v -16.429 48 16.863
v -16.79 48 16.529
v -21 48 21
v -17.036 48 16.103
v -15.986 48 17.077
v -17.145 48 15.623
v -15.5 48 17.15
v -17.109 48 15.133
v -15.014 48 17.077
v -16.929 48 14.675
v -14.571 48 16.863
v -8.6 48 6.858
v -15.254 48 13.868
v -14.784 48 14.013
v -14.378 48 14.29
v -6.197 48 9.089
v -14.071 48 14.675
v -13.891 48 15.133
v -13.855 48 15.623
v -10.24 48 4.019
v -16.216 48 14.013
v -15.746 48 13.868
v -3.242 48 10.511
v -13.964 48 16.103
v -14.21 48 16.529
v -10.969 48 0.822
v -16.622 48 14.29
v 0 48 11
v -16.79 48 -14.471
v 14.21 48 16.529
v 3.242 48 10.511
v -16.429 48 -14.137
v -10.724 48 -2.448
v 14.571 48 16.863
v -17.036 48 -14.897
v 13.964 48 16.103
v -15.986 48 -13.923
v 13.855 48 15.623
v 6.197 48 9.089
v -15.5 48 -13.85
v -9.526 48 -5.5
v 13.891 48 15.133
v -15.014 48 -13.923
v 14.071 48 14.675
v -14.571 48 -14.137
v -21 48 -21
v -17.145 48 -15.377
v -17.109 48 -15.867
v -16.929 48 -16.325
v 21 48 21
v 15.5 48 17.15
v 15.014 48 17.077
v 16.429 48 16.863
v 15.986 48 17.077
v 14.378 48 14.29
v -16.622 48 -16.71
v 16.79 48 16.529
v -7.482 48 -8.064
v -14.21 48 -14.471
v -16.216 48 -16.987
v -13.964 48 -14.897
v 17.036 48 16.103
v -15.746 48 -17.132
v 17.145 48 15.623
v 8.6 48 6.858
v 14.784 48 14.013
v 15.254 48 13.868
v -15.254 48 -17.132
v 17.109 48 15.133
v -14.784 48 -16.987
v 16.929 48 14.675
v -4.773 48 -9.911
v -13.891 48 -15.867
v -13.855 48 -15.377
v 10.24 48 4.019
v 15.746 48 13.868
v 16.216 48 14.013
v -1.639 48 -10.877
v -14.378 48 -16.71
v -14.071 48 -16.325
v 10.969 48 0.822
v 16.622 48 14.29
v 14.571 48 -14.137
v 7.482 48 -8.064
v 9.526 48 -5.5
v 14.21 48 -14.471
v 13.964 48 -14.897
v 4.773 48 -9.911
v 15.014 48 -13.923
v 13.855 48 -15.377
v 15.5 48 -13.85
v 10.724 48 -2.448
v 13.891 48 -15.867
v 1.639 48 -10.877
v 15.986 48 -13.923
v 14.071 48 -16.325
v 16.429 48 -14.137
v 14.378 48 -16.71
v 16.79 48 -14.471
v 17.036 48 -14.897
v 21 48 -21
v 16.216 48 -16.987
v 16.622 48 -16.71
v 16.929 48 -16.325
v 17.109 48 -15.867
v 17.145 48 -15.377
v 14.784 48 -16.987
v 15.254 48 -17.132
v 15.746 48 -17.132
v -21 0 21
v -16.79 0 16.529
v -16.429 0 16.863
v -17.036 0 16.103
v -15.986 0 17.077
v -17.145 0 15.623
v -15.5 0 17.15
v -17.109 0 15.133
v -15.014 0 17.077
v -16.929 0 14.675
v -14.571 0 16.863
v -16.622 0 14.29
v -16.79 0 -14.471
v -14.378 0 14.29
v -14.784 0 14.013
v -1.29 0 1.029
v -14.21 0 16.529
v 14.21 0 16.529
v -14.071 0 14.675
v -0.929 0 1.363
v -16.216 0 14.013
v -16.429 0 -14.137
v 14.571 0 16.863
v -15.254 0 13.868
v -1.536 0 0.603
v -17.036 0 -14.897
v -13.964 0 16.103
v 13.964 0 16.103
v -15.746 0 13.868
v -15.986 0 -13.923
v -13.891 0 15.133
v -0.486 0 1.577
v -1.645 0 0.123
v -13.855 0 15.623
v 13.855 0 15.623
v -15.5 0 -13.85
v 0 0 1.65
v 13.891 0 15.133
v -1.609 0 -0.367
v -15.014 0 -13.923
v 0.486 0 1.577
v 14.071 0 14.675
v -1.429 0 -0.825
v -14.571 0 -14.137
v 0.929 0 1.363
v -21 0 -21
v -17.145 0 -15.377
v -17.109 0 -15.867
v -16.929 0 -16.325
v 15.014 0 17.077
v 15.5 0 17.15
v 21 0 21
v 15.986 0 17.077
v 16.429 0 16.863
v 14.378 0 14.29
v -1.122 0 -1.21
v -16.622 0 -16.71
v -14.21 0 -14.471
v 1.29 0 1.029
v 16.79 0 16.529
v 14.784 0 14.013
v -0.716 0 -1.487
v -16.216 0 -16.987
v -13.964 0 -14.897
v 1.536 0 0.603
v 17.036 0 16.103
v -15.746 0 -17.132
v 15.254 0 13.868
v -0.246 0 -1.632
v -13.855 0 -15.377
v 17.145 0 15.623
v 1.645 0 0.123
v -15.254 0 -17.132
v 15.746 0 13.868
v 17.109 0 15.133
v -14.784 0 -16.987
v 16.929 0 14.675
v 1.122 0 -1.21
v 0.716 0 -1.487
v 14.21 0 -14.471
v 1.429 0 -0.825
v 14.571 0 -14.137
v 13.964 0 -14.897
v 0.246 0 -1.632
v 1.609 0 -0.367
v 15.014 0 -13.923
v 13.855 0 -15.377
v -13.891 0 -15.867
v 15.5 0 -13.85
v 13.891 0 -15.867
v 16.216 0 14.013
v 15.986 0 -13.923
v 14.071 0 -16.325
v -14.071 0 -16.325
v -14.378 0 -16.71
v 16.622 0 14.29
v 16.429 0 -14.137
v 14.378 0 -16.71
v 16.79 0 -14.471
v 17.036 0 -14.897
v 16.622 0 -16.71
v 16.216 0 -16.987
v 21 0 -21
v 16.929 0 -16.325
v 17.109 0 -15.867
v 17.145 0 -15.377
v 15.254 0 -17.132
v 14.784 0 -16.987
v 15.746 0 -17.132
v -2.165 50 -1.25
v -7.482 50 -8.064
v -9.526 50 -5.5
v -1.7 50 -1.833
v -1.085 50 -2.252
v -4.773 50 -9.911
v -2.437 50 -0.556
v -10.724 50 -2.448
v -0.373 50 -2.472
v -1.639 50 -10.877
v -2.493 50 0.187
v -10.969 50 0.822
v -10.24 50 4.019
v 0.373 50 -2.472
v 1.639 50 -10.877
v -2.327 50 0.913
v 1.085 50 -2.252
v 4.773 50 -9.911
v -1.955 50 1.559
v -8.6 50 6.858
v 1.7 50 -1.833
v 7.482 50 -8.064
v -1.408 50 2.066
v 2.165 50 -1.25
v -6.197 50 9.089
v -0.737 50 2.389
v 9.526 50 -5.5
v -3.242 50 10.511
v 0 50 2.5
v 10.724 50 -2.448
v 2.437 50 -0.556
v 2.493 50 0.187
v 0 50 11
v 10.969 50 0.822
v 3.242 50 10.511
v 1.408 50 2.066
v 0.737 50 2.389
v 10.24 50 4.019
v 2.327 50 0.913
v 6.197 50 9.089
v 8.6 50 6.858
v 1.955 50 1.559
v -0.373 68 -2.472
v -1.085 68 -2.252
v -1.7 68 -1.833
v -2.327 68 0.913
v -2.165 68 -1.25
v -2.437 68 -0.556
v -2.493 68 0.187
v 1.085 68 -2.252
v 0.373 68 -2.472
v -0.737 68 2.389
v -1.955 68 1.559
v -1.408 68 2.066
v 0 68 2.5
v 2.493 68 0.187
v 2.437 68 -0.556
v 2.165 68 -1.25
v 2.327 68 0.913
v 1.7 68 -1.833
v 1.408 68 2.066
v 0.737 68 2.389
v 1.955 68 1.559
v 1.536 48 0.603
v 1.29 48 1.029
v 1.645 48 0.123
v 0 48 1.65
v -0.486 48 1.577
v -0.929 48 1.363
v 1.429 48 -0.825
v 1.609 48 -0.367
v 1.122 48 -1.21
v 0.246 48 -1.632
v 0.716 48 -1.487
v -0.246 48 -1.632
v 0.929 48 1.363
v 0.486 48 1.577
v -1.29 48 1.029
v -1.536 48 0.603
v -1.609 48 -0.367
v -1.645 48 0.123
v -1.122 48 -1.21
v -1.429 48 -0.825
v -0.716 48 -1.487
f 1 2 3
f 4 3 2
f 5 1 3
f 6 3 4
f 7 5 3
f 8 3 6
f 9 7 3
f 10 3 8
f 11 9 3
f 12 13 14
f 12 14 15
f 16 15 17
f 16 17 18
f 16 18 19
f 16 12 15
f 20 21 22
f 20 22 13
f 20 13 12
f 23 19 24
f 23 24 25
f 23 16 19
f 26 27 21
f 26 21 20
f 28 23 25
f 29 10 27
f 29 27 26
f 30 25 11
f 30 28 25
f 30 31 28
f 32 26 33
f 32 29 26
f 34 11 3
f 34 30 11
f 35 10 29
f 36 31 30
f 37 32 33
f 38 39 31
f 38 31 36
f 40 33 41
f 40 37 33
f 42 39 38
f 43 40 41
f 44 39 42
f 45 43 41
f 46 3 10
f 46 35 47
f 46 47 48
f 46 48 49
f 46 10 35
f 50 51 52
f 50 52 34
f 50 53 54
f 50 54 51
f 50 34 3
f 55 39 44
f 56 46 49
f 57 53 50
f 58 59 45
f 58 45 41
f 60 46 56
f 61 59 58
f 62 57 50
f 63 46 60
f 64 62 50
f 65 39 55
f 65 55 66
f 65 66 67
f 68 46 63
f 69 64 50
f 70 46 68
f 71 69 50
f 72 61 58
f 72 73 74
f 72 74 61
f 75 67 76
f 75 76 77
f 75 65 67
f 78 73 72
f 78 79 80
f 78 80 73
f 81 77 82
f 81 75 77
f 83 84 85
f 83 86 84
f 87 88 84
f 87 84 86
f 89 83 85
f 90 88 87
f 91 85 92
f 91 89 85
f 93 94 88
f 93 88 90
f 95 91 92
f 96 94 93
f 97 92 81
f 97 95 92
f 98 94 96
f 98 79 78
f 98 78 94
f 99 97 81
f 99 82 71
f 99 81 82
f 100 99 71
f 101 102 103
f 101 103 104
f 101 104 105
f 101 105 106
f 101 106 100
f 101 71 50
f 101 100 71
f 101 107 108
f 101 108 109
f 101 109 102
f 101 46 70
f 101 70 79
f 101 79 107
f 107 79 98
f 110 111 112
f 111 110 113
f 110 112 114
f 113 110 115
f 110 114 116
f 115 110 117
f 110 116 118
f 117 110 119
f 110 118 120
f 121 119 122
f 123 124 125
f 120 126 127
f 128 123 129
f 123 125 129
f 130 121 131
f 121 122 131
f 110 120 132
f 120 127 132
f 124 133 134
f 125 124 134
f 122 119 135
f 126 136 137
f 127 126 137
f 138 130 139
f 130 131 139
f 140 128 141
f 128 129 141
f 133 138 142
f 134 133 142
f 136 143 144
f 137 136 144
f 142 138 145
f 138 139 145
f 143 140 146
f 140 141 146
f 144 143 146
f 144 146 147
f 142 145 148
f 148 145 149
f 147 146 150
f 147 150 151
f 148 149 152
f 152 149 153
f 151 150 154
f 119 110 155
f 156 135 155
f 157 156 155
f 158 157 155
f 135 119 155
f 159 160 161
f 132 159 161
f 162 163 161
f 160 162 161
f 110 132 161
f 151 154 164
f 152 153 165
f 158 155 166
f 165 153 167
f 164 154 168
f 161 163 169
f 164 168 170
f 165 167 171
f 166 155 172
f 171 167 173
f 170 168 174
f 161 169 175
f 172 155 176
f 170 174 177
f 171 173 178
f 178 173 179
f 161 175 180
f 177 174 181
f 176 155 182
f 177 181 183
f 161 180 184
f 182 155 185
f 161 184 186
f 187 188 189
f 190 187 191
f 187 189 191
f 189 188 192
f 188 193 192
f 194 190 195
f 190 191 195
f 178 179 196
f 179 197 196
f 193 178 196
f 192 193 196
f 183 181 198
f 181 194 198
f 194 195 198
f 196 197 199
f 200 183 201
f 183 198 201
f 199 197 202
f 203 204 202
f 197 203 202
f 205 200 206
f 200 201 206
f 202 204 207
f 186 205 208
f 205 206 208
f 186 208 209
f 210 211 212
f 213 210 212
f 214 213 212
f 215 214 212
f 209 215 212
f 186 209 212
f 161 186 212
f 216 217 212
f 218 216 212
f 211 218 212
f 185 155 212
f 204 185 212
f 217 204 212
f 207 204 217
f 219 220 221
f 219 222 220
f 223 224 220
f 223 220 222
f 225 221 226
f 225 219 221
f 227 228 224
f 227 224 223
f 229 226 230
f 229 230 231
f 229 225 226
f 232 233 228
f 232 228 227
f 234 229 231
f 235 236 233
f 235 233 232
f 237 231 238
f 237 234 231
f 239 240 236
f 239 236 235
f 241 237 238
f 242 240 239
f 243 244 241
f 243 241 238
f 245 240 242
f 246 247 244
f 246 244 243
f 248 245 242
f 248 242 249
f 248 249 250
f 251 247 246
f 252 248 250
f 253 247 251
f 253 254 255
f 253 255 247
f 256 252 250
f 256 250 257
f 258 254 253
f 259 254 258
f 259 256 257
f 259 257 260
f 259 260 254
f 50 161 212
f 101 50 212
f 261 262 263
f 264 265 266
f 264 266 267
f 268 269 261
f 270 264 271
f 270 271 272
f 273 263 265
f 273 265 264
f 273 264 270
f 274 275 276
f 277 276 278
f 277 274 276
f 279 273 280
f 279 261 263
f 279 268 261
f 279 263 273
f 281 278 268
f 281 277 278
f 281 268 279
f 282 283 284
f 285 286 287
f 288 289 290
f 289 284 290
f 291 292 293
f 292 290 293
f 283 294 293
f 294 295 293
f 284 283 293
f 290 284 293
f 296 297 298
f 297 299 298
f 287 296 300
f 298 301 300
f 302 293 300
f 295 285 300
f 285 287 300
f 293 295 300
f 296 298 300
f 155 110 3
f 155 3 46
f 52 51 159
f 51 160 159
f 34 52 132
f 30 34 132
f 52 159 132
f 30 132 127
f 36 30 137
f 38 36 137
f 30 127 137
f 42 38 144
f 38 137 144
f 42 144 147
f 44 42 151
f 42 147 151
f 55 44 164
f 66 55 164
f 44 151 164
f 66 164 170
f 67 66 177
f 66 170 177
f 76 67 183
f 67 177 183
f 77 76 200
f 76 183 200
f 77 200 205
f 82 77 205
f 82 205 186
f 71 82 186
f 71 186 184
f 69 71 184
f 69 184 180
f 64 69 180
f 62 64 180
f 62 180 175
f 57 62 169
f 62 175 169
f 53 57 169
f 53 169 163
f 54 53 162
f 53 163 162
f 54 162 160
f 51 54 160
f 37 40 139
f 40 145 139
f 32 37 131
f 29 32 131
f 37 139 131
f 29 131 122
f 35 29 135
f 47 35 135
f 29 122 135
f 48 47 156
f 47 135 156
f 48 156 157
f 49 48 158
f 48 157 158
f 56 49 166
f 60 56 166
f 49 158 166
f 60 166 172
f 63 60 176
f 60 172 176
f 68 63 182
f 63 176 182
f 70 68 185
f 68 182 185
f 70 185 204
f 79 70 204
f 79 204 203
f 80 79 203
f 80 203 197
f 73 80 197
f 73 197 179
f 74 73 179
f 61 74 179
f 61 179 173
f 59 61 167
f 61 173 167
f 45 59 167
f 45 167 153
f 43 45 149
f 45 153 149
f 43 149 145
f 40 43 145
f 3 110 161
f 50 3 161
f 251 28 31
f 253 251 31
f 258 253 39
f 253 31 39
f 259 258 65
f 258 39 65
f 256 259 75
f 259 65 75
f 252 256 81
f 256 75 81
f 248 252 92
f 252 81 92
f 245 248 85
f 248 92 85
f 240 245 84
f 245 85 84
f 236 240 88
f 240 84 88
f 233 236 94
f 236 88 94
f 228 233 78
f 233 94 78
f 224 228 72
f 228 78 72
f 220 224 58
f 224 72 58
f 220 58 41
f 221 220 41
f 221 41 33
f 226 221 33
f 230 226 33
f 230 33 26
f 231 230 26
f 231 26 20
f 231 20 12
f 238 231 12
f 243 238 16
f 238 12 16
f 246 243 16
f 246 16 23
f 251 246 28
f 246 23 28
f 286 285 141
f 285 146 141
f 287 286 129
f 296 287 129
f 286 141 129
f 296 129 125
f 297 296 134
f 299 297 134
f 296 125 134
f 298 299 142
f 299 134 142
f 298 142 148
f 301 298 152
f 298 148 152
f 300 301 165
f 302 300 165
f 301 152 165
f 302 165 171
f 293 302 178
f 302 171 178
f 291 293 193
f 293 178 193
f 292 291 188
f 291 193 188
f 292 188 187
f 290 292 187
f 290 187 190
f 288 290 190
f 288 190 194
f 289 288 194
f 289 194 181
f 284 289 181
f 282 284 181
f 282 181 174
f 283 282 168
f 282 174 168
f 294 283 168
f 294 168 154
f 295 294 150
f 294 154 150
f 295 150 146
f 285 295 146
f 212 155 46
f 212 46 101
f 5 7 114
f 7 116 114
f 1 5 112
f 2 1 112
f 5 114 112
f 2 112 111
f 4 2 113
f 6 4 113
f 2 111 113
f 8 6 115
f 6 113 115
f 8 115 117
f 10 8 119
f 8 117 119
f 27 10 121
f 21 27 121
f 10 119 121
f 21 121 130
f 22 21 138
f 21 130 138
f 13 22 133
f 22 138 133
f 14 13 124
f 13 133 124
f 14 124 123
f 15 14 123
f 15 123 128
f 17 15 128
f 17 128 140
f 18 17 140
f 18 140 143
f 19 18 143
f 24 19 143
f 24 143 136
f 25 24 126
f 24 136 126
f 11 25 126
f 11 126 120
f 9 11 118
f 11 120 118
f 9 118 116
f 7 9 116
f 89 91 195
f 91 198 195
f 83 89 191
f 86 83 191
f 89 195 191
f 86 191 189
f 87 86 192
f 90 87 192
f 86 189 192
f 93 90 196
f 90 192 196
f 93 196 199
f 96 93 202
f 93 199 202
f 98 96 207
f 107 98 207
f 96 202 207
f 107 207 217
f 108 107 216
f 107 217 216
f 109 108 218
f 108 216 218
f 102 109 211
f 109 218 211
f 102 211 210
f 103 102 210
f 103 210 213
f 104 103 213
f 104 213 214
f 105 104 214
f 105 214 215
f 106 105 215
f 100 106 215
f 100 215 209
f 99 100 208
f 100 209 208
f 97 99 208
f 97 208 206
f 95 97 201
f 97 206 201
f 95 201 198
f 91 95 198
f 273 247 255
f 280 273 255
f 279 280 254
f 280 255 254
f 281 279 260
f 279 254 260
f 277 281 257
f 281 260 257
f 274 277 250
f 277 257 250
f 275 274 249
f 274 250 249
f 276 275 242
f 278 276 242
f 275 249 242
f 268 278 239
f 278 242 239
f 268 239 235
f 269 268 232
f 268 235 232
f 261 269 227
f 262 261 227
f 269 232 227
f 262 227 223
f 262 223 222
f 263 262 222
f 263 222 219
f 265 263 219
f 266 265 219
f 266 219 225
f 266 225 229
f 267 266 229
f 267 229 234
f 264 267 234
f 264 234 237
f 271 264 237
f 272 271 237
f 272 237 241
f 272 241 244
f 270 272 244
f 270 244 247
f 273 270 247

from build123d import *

# Parameters (mm, degrees)
SKETCH1_W                            = 42
SKETCH1_H                            = 42
BOSS_EXTRUDE1_DEPTH                  = 48
SKETCH2_R                            = 2.5
BOSS_EXTRUDE2_DEPTH                  = 20
SKETCH4_W                            = 1.65
SKETCH4_H                            = 48
TAP_DRILL_FOR_M4X0_7_TAP1_AT_2_COUNT = 2
TAP_DRILL_FOR_M4X0_7_TAP1_AT_2_PITCH = 31
TAP_DRILL_FOR_M4X0_7_TAP1_AT_3_COUNT = 2
TAP_DRILL_FOR_M4X0_7_TAP1_AT_3_PITCH = 43.840620434
TAP_DRILL_FOR_M4X0_7_TAP1_AT_4_COUNT = 2
TAP_DRILL_FOR_M4X0_7_TAP1_AT_4_PITCH = 31
TAP_DRILL_FOR_M4X0_7_TAP1_AT_5_COUNT = 2
TAP_DRILL_FOR_M4X0_7_TAP1_AT_5_PITCH = 21.920310217
SKETCH6_R                            = 11
BOSS_EXTRUDE3_DEPTH                  = 2


with BuildPart() as part:
    # Sketch1 → Boss-Extrude1 (new body)
    with BuildSketch(Plane(origin=(0, 0, 0), x_dir=(1, 0, 0), z_dir=(0, 1, 0))):
        Rectangle(SKETCH1_W, SKETCH1_H)
    extrude(amount=BOSS_EXTRUDE1_DEPTH)

    # Sketch2 → Boss-Extrude2 (add)
    with BuildSketch(Plane(origin=(0, 48, 0), x_dir=(1, 0, 0), z_dir=(0, 1, 0))):
        with Locations(Location((0, 0, 0), (0, 0, 270))):
            Circle(SKETCH2_R)
    extrude(amount=BOSS_EXTRUDE2_DEPTH)

    # Sketch4 → Tap Drill for M4x0.7 Tap1 (revolve, cut)
    with BuildSketch(Plane(origin=(-15.5, 48, -15.5), x_dir=(0, 0, 1), z_dir=(1, 0, 0))):
        with Locations((0.825, 24)):
            Rectangle(SKETCH4_W, SKETCH4_H)
    tap_drill_for_m4x0_7_tap1 = revolve(axis=Axis((-15.5, 54.35, -15.5), (0, -1, 0)), mode=Mode.SUBTRACT)

    # Tap Drill for M4x0.7 Tap1 at 2: Tap Drill for M4x0.7 Tap1 ×2
    with Locations(*[(0, 0, i * TAP_DRILL_FOR_M4X0_7_TAP1_AT_2_PITCH) for i in range(1, TAP_DRILL_FOR_M4X0_7_TAP1_AT_2_COUNT)]):
        add(tap_drill_for_m4x0_7_tap1, mode=Mode.SUBTRACT)

    # Tap Drill for M4x0.7 Tap1 at 3: Tap Drill for M4x0.7 Tap1 ×2
    with Locations(*[Vector(0.7071067811865476, 0, 0.7071067811865475) * (i * TAP_DRILL_FOR_M4X0_7_TAP1_AT_3_PITCH) for i in range(1, TAP_DRILL_FOR_M4X0_7_TAP1_AT_3_COUNT)]):
        add(tap_drill_for_m4x0_7_tap1, mode=Mode.SUBTRACT)

    # Tap Drill for M4x0.7 Tap1 at 4: Tap Drill for M4x0.7 Tap1 ×2
    with Locations(*[(i * TAP_DRILL_FOR_M4X0_7_TAP1_AT_4_PITCH, 0, 0) for i in range(1, TAP_DRILL_FOR_M4X0_7_TAP1_AT_4_COUNT)]):
        add(tap_drill_for_m4x0_7_tap1, mode=Mode.SUBTRACT)

    # Tap Drill for M4x0.7 Tap1 at 5: Tap Drill for M4x0.7 Tap1 ×2
    with Locations(*[Vector(0.7071067811865477, 0, 0.7071067811865475) * (i * TAP_DRILL_FOR_M4X0_7_TAP1_AT_5_PITCH) for i in range(1, TAP_DRILL_FOR_M4X0_7_TAP1_AT_5_COUNT)]):
        add(tap_drill_for_m4x0_7_tap1, mode=Mode.SUBTRACT)

    # Sketch6 → Boss-Extrude3 (add)
    with BuildSketch(Plane(origin=(0, 48, 0), x_dir=(1, 0, 0), z_dir=(0, 1, 0))):
        with Locations(Location((0, 0, 0), (0, 0, 270))):
            Circle(SKETCH6_R)
    extrude(amount=BOSS_EXTRUDE3_DEPTH)


solid = part.part
